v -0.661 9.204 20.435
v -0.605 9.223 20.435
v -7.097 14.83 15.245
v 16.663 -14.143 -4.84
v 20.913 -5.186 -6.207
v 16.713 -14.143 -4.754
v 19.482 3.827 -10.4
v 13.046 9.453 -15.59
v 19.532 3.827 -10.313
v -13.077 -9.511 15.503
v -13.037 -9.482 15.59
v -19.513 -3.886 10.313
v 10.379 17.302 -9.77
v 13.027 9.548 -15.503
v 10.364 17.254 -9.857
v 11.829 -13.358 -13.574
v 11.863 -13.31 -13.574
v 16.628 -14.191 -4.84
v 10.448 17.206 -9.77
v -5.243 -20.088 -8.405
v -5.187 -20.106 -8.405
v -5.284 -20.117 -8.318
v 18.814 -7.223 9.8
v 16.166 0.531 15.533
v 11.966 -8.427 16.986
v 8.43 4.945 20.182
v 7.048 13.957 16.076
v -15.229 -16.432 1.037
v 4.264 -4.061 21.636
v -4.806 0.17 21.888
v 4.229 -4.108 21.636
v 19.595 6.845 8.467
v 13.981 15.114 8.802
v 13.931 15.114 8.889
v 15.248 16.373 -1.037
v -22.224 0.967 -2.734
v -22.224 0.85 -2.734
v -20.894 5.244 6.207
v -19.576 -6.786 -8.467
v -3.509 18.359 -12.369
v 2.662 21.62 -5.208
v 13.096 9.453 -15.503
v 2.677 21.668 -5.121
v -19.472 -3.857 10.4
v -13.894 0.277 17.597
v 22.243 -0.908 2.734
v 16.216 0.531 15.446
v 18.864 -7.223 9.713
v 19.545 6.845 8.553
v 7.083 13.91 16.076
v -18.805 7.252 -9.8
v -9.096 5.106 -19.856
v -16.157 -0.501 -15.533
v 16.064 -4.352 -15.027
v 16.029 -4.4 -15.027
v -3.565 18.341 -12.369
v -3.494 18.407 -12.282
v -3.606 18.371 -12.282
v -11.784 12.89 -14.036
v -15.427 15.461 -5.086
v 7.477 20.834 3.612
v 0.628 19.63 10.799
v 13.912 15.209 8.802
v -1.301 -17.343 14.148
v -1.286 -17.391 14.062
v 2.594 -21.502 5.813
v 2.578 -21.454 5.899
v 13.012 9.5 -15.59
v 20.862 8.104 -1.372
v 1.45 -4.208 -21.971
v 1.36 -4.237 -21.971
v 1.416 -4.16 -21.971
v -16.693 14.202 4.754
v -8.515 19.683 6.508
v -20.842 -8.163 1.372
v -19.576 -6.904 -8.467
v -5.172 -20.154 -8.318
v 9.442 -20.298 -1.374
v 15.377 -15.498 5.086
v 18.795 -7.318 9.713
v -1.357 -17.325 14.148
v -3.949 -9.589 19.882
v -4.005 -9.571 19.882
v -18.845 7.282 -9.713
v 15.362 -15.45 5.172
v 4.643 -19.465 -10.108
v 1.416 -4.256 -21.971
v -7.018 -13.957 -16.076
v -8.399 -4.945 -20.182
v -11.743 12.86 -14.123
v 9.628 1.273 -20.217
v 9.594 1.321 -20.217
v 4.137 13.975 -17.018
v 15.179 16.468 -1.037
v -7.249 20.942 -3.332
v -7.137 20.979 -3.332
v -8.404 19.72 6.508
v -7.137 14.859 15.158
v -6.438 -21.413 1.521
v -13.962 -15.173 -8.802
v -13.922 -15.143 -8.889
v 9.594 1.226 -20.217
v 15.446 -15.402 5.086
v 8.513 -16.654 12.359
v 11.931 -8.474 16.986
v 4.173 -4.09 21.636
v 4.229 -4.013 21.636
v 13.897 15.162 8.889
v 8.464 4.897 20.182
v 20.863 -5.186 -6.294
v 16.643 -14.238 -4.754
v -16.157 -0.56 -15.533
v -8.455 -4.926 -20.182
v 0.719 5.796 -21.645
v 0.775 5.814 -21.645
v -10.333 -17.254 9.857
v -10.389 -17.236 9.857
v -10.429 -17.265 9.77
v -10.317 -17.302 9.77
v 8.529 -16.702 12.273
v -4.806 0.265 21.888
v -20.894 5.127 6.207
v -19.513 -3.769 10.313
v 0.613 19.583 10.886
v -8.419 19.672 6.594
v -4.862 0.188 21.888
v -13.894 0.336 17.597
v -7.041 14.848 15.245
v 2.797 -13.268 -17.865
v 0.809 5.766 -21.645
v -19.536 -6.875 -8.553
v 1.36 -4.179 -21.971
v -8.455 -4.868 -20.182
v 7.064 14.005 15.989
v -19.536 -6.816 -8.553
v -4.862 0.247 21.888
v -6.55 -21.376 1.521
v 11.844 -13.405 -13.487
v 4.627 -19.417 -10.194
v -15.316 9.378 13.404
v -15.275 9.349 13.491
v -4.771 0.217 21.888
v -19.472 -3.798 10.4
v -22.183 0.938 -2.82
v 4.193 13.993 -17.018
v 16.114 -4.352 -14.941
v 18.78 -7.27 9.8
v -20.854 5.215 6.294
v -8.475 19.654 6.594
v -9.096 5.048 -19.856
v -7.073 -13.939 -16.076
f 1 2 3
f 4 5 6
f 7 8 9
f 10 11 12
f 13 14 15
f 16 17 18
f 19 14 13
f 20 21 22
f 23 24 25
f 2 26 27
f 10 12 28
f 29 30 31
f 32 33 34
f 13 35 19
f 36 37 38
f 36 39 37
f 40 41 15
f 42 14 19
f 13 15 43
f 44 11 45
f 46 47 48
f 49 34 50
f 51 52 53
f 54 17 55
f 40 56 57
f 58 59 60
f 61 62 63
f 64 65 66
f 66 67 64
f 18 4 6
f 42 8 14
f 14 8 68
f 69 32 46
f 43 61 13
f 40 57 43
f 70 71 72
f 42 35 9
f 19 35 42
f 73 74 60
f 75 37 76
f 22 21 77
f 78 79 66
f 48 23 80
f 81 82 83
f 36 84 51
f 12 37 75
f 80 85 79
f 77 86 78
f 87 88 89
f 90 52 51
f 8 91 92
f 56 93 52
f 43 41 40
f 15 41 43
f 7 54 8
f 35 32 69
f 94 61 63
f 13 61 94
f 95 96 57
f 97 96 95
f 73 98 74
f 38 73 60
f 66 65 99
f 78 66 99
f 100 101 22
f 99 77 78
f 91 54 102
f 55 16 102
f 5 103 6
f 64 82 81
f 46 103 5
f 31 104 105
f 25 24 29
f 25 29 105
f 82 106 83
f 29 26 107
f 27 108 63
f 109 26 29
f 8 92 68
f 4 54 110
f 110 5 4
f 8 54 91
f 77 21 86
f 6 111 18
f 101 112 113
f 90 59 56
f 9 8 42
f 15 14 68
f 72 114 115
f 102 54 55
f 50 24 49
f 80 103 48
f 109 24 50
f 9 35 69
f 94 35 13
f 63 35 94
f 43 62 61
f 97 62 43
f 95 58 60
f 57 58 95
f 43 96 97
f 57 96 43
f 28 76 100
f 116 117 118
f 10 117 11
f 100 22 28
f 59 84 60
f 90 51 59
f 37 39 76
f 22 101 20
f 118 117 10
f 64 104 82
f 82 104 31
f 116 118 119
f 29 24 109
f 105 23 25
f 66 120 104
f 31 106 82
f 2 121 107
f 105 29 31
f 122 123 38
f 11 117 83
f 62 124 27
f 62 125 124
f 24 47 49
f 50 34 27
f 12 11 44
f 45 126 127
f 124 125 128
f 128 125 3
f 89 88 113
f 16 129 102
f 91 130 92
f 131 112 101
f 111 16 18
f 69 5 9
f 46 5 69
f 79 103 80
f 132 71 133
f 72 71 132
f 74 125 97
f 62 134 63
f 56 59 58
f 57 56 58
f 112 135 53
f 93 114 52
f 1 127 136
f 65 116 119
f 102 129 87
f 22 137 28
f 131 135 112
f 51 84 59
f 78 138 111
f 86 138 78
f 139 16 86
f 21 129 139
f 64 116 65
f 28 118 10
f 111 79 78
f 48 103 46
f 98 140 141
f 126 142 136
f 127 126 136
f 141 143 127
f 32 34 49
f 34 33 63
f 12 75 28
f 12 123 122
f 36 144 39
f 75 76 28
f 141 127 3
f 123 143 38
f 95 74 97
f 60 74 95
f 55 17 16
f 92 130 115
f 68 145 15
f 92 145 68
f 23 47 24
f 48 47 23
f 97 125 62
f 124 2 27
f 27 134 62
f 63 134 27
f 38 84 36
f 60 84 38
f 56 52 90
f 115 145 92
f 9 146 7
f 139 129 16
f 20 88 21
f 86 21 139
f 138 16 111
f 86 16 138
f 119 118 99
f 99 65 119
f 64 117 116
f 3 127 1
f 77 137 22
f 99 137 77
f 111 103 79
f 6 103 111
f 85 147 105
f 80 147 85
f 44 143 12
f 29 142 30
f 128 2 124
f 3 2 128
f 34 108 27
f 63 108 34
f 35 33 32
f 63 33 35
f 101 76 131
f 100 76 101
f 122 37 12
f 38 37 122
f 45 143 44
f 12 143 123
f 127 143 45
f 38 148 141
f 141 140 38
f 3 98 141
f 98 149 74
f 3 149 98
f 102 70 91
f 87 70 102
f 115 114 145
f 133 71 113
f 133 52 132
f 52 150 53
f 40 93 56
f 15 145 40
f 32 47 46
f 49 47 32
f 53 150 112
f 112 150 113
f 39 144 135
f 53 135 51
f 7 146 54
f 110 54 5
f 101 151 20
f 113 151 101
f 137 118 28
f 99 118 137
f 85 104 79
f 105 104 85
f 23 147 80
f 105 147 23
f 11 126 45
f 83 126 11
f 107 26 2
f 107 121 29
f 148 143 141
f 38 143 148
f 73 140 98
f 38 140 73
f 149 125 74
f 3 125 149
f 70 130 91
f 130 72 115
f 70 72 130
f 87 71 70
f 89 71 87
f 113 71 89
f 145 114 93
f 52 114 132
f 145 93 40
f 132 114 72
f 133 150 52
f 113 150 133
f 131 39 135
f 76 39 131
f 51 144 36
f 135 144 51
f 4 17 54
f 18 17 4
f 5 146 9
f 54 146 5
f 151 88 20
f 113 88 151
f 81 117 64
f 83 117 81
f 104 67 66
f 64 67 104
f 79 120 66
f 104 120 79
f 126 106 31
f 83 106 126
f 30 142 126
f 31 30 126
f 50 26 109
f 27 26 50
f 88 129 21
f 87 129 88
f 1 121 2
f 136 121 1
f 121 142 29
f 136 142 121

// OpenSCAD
// Auto-generated OpenSCAD file

    inner_points = 10*[[-2.0761541235761705, -0.8104417535921696, 0.13724502428832586], [1.3881323190734756, 1.5113986256831482, 0.8802447594428363], [-1.5147673311324563, -1.6373143484753303, 0.10368044324004255], [1.9495191115171902, 0.6845260307999875, 0.846680178394553], [-1.9495191115171902, -0.6845260307999875, -0.846680178394553], [1.5147673311324563, 1.6373143484753303, -0.10368044324004255], [-1.3881323190734756, -1.5113986256831482, -0.8802447594428363], [2.0761541235761705, 0.8104417535921696, -0.13724502428832586], [-1.5234633524618937, 0.9319192053080169, 1.3403932206570697], [-0.7056562584656506, 1.480031367720886, 1.5157916654178742], [-0.3964274104829382, -0.954186159239866, 1.9795055087654227], [0.4213796835133048, -0.4060739968269973, 2.1549039535262273], [-1.170296744166604, 1.28307982057967, -1.40363089240515], [-0.35248965017036094, 1.831191982992539, -1.2282324476443454], [0.14000710893040944, -0.42079859805616315, -2.1884685345745107], [0.9578142029266525, 0.1273135643567057, -2.013070089813706], [-1.6612573602586815, 1.4143303177258313, 0.47535430243945176], [-0.8434502662624384, 1.9624424801387002, 0.6507527472002564], [-0.6469132683711399, -2.131768469941571, 0.15209993842251773], [1.5346223481997008, -1.5402460405180134, 0.5085709002434271], [-1.5346223481997008, 1.5402460405180134, -0.5085709002434271], [-0.7168152542034577, 2.0883582029308823, -0.3331724554826224], [-0.5202782563121594, -2.005852747149389, -0.8318252642603612], [1.6612573602586815, -1.4143303177258313, -0.47535430243945176], [-2.2142917828860567, 0.0908460622564875, -0.27336216035795285], [0.7445620794331305, 2.073934495513449, 0.3612353743605092], [0.9410990773244287, -2.020276454566821, -0.13741743441722942], [2.2142917828860567, -0.0908460622564875, 0.27336216035795285], [-1.2996082730590448, -0.9452718178121089, 1.550337867868314], [0.8414384952638997, 0.4897044530319842, 2.009536957825971], [-0.8414384952638997, -0.4897044530319842, -2.009536957825971], [1.2996082730590448, 0.9452718178121089, -1.550337867868314], [-0.48214483057590074, 0.02171704803160296, 2.1801680462004573], [0.8497908650802382, -1.6606523973205198, 1.2272559139802832], [0.07592153139657254, 0.5766135824990164, -2.1558804871902892], [1.1813256308164024, -1.3310007553325773, -1.3486937090311228], [-1.9431785126993897, -0.3827359479818073, 1.0313284827859868], [0.7033008359540129, 1.390992268880641, 1.5989297731796923], [-1.0348356016901774, -1.7206439108685836, 0.9770198498317137], [1.6116437469632254, 0.05308430599386482, 1.5446211402254193], [-1.6116437469632254, -0.05308430599386482, -1.5446211402254193], [1.0348356016901774, 1.7206439108685836, -0.9770198498317137], [-0.7033008359540129, -1.390992268880641, -1.5989297731796923], [1.9431785126993897, 0.3827359479818073, -1.0313284827859868], [-1.385325693152007, 0.03063138945936017, 1.7510004053033483], [-0.06208601882530573, 0.9174954978905845, 2.034801050500201], [-0.13165473911407088, -1.7295582522963406, 1.4061874907288225], [1.1915849352126302, -0.8426941438651167, 1.6899881359256754], [-0.9055240727977366, 0.5077077275231954, -1.97694891044175], [0.4177156015289647, 1.3945718359544197, -1.693148265244897], [0.278144768240296, -1.32208641390482, -1.7778613499282319], [1.6013844425669974, -0.43522230547359575, -1.494060704731379], [-2.0813161720092763, 0.5185518678668495, 0.6207212981397079], [0.05973059631366806, 1.9535281387109422, 1.0799203880973653], [0.25626759420496636, -2.140682811369328, 0.5812675793196267], [1.8764164183320928, -0.7222877870626099, 0.9713031221888193], [-1.8764164183320928, 0.7222877870626099, -0.9713031221888193], [0.2646303499908518, 2.1572640579067026, -0.5121040322311619], [0.46116734788214997, -1.9369468921735673, -1.0107568410089005], [2.0813161720092763, -0.5185518678668495, -0.6207212981397079]];

    outer_points = 10*[[-0.4268823140701343, -0.9336759799671088, 1.9829494778905428], [1.044314103840851, 1.7142316985032462, -0.9782053536275224], [-0.14875493293223763, -1.7142316985032462, 1.4231477896813076], [1.3224414849787478, 0.9336759799671088, -1.5380070418367575], [-1.3224414849787478, -0.9336759799671088, 1.5380070418367575], [0.14875493293223763, 1.7142316985032462, -1.4231477896813076], [-1.044314103840851, -1.7142316985032462, 0.9782053536275224], [0.4268823140701343, 0.9336759799671088, -1.9829494778905428], [0.6104399772973251, 0.9916253074667056, 1.9052848241689724], [0.9577423401785069, 1.6167115177293658, 1.2062509920287723], [1.8622372720494769, -0.7028209643993987, 1.0120192745645764], [2.2095396349306586, -0.07773475413673858, 0.3129854424243763], [-1.887144140831298, 0.9916253074667056, 0.6644051616426931], [-1.5398417779501163, 1.6167115177293658, -0.03462867049750695], [-1.931412253792762, -0.7028209643993987, -0.8727871306336115], [-1.5841098909115803, -0.07773475413673858, -1.5718209627738116], [-0.3149548424383457, 1.340700436841305, 1.757667136683724], [0.032347520442836064, 1.9657866471039651, 1.058633304543524], [0.25532809774881876, -2.1328349056634375, 0.6098285047317775], [1.2105140133469592, -1.340700436841305, -1.3127247006299387], [-1.2105140133469592, 1.340700436841305, 1.3127247006299387], [-0.8632116504657774, 1.9657866471039651, 0.6136908684897385], [-0.6402310731597947, -2.1328349056634375, 0.16488606867799224], [0.3149548424383457, -1.340700436841305, -1.757667136683724], [-0.9923493451491374, -0.10903087669423184, 1.9973540053303405], [0.26420240812812773, 2.1525522779349355, -0.531774158638992], [0.4871829854341103, -1.9460692748324666, -0.9805789584507381], [0.9923493451491374, 0.10903087669423184, -1.9973540053303405], [1.1654570644439781, -0.8182484721832537, 1.7199555942544524], [2.0747064548400616, 0.8182484721832537, -0.11013873757468051], [-2.0747064548400616, -0.8182484721832537, 0.11013873757468051], [-1.1654570644439781, 0.8182484721832537, -1.7199555942544524], [1.872687215981827, 0.28240771197768405, 1.1829439770392984], [1.6754393332671662, -1.4120385598884204, -0.4302535571372985], [-2.0739420796136083, 0.28240771197768405, -0.7778676700591818], [-0.6691650151082599, -1.4120385598884204, -1.5951279777632852], [0.3853453687312546, -0.37992789275156413, 2.166386789242983], [1.5092394237610585, 1.6428935754561307, -0.09573421013488248], [0.8353649246143677, -1.6428935754561307, 1.2606086307608693], [1.9592589796441717, 0.37992789275156413, -1.0015123686169962], [-1.9592589796441717, -0.37992789275156413, 1.0015123686169962], [-0.8353649246143677, 1.6428935754561307, -1.2606086307608693], [-1.5092394237610585, -1.6428935754561307, 0.09573421013488248], [-0.3853453687312546, 0.37992789275156413, -2.166386789242983], [1.1759070083763283, 0.16698020419382897, 1.8908802967291745], [1.7378540358912302, 1.1783909382976763, 0.7598197970402418], [1.5321451322198667, -1.5274660676722758, 0.5526723110709932], [2.0940921597347684, -0.5160553335684283, -0.5783881886179393], [-2.2172362806609085, 0.16698020419382897, 0.20505819814910997], [-1.6552892531460064, 1.1783909382976763, -0.9260023015398227], [-1.3659452227137587, -1.5274660676722758, -0.8871916580734094], [-0.8039981951988568, -0.5160553335684283, -2.018252157762342], [-0.1801216623477485, 0.44471721052131286, 2.1807913166827806], [0.729127728048335, 2.08121415488782, 0.3506969848536479], [0.9521083053543176, -2.017407397879582, -0.09810781495809817], [1.6291668398145611, -0.44471721052131286, -1.4608593321105792], [-1.6291668398145611, 0.44471721052131286, 1.4608593321105792], [-0.7199174494184777, 2.08121415488782, -0.3692349997185534], [-0.49693687211249515, -2.017407397879582, -0.8180397995302995], [0.1801216623477485, -0.44471721052131286, -2.1807913166827806]];

    // Convex hull for inner set (I)
    module inner_hull() {
        hull() {
            for (p = inner_points) {
                translate(p) sphere(r=0.1);
            }
        }
    }

    // Convex hull for outer set (O) minus inner hull (O \ I)
    module outer_minus_inner() {
        difference() {
            hull() {
                for (p = outer_points) {
                    translate(p) sphere(r=0.1);
                }
            }
            inner_hull(); // Subtract inner hull
        }
    }

    // Convex hull for outer set (O) minus all translated inner hulls
    module outer_minus_AllTranslationInner() {
        difference() {
            hull() {
                for (p = outer_points) {
                    translate(p) sphere(r=0.1);
                }
            }
            hull() {
                translate([0,0,50]) inner_hull();
                translate([0,0,-50]) inner_hull();
            }; // Subtract translated inner hulls
        }
    }

    // Difference between outer_minus_inner and outer_minus_AllTranslationInner
    module outer_minus_inner_diff() {
        difference() {
            // Outer minus inner
            difference() {
                hull() {
                    for (p = outer_points) {
                        translate(p) sphere(r=0.1);
                    }
                }
                inner_hull();
            }

            // Subtract Outer minus AllTranslationInner
            difference() {
                hull() {
                    for (p = outer_points) {
                        translate(p) sphere(r=0.1);
                    }
                }
                hull() {
                    translate([0,0,50]) inner_hull();
                    translate([0,0,-50]) inner_hull();
                };
            }
        }
    }

    // Rendering all with colors applied
    color([1, 0, 0, 0.5]) inner_hull(); // Transparent red
    
